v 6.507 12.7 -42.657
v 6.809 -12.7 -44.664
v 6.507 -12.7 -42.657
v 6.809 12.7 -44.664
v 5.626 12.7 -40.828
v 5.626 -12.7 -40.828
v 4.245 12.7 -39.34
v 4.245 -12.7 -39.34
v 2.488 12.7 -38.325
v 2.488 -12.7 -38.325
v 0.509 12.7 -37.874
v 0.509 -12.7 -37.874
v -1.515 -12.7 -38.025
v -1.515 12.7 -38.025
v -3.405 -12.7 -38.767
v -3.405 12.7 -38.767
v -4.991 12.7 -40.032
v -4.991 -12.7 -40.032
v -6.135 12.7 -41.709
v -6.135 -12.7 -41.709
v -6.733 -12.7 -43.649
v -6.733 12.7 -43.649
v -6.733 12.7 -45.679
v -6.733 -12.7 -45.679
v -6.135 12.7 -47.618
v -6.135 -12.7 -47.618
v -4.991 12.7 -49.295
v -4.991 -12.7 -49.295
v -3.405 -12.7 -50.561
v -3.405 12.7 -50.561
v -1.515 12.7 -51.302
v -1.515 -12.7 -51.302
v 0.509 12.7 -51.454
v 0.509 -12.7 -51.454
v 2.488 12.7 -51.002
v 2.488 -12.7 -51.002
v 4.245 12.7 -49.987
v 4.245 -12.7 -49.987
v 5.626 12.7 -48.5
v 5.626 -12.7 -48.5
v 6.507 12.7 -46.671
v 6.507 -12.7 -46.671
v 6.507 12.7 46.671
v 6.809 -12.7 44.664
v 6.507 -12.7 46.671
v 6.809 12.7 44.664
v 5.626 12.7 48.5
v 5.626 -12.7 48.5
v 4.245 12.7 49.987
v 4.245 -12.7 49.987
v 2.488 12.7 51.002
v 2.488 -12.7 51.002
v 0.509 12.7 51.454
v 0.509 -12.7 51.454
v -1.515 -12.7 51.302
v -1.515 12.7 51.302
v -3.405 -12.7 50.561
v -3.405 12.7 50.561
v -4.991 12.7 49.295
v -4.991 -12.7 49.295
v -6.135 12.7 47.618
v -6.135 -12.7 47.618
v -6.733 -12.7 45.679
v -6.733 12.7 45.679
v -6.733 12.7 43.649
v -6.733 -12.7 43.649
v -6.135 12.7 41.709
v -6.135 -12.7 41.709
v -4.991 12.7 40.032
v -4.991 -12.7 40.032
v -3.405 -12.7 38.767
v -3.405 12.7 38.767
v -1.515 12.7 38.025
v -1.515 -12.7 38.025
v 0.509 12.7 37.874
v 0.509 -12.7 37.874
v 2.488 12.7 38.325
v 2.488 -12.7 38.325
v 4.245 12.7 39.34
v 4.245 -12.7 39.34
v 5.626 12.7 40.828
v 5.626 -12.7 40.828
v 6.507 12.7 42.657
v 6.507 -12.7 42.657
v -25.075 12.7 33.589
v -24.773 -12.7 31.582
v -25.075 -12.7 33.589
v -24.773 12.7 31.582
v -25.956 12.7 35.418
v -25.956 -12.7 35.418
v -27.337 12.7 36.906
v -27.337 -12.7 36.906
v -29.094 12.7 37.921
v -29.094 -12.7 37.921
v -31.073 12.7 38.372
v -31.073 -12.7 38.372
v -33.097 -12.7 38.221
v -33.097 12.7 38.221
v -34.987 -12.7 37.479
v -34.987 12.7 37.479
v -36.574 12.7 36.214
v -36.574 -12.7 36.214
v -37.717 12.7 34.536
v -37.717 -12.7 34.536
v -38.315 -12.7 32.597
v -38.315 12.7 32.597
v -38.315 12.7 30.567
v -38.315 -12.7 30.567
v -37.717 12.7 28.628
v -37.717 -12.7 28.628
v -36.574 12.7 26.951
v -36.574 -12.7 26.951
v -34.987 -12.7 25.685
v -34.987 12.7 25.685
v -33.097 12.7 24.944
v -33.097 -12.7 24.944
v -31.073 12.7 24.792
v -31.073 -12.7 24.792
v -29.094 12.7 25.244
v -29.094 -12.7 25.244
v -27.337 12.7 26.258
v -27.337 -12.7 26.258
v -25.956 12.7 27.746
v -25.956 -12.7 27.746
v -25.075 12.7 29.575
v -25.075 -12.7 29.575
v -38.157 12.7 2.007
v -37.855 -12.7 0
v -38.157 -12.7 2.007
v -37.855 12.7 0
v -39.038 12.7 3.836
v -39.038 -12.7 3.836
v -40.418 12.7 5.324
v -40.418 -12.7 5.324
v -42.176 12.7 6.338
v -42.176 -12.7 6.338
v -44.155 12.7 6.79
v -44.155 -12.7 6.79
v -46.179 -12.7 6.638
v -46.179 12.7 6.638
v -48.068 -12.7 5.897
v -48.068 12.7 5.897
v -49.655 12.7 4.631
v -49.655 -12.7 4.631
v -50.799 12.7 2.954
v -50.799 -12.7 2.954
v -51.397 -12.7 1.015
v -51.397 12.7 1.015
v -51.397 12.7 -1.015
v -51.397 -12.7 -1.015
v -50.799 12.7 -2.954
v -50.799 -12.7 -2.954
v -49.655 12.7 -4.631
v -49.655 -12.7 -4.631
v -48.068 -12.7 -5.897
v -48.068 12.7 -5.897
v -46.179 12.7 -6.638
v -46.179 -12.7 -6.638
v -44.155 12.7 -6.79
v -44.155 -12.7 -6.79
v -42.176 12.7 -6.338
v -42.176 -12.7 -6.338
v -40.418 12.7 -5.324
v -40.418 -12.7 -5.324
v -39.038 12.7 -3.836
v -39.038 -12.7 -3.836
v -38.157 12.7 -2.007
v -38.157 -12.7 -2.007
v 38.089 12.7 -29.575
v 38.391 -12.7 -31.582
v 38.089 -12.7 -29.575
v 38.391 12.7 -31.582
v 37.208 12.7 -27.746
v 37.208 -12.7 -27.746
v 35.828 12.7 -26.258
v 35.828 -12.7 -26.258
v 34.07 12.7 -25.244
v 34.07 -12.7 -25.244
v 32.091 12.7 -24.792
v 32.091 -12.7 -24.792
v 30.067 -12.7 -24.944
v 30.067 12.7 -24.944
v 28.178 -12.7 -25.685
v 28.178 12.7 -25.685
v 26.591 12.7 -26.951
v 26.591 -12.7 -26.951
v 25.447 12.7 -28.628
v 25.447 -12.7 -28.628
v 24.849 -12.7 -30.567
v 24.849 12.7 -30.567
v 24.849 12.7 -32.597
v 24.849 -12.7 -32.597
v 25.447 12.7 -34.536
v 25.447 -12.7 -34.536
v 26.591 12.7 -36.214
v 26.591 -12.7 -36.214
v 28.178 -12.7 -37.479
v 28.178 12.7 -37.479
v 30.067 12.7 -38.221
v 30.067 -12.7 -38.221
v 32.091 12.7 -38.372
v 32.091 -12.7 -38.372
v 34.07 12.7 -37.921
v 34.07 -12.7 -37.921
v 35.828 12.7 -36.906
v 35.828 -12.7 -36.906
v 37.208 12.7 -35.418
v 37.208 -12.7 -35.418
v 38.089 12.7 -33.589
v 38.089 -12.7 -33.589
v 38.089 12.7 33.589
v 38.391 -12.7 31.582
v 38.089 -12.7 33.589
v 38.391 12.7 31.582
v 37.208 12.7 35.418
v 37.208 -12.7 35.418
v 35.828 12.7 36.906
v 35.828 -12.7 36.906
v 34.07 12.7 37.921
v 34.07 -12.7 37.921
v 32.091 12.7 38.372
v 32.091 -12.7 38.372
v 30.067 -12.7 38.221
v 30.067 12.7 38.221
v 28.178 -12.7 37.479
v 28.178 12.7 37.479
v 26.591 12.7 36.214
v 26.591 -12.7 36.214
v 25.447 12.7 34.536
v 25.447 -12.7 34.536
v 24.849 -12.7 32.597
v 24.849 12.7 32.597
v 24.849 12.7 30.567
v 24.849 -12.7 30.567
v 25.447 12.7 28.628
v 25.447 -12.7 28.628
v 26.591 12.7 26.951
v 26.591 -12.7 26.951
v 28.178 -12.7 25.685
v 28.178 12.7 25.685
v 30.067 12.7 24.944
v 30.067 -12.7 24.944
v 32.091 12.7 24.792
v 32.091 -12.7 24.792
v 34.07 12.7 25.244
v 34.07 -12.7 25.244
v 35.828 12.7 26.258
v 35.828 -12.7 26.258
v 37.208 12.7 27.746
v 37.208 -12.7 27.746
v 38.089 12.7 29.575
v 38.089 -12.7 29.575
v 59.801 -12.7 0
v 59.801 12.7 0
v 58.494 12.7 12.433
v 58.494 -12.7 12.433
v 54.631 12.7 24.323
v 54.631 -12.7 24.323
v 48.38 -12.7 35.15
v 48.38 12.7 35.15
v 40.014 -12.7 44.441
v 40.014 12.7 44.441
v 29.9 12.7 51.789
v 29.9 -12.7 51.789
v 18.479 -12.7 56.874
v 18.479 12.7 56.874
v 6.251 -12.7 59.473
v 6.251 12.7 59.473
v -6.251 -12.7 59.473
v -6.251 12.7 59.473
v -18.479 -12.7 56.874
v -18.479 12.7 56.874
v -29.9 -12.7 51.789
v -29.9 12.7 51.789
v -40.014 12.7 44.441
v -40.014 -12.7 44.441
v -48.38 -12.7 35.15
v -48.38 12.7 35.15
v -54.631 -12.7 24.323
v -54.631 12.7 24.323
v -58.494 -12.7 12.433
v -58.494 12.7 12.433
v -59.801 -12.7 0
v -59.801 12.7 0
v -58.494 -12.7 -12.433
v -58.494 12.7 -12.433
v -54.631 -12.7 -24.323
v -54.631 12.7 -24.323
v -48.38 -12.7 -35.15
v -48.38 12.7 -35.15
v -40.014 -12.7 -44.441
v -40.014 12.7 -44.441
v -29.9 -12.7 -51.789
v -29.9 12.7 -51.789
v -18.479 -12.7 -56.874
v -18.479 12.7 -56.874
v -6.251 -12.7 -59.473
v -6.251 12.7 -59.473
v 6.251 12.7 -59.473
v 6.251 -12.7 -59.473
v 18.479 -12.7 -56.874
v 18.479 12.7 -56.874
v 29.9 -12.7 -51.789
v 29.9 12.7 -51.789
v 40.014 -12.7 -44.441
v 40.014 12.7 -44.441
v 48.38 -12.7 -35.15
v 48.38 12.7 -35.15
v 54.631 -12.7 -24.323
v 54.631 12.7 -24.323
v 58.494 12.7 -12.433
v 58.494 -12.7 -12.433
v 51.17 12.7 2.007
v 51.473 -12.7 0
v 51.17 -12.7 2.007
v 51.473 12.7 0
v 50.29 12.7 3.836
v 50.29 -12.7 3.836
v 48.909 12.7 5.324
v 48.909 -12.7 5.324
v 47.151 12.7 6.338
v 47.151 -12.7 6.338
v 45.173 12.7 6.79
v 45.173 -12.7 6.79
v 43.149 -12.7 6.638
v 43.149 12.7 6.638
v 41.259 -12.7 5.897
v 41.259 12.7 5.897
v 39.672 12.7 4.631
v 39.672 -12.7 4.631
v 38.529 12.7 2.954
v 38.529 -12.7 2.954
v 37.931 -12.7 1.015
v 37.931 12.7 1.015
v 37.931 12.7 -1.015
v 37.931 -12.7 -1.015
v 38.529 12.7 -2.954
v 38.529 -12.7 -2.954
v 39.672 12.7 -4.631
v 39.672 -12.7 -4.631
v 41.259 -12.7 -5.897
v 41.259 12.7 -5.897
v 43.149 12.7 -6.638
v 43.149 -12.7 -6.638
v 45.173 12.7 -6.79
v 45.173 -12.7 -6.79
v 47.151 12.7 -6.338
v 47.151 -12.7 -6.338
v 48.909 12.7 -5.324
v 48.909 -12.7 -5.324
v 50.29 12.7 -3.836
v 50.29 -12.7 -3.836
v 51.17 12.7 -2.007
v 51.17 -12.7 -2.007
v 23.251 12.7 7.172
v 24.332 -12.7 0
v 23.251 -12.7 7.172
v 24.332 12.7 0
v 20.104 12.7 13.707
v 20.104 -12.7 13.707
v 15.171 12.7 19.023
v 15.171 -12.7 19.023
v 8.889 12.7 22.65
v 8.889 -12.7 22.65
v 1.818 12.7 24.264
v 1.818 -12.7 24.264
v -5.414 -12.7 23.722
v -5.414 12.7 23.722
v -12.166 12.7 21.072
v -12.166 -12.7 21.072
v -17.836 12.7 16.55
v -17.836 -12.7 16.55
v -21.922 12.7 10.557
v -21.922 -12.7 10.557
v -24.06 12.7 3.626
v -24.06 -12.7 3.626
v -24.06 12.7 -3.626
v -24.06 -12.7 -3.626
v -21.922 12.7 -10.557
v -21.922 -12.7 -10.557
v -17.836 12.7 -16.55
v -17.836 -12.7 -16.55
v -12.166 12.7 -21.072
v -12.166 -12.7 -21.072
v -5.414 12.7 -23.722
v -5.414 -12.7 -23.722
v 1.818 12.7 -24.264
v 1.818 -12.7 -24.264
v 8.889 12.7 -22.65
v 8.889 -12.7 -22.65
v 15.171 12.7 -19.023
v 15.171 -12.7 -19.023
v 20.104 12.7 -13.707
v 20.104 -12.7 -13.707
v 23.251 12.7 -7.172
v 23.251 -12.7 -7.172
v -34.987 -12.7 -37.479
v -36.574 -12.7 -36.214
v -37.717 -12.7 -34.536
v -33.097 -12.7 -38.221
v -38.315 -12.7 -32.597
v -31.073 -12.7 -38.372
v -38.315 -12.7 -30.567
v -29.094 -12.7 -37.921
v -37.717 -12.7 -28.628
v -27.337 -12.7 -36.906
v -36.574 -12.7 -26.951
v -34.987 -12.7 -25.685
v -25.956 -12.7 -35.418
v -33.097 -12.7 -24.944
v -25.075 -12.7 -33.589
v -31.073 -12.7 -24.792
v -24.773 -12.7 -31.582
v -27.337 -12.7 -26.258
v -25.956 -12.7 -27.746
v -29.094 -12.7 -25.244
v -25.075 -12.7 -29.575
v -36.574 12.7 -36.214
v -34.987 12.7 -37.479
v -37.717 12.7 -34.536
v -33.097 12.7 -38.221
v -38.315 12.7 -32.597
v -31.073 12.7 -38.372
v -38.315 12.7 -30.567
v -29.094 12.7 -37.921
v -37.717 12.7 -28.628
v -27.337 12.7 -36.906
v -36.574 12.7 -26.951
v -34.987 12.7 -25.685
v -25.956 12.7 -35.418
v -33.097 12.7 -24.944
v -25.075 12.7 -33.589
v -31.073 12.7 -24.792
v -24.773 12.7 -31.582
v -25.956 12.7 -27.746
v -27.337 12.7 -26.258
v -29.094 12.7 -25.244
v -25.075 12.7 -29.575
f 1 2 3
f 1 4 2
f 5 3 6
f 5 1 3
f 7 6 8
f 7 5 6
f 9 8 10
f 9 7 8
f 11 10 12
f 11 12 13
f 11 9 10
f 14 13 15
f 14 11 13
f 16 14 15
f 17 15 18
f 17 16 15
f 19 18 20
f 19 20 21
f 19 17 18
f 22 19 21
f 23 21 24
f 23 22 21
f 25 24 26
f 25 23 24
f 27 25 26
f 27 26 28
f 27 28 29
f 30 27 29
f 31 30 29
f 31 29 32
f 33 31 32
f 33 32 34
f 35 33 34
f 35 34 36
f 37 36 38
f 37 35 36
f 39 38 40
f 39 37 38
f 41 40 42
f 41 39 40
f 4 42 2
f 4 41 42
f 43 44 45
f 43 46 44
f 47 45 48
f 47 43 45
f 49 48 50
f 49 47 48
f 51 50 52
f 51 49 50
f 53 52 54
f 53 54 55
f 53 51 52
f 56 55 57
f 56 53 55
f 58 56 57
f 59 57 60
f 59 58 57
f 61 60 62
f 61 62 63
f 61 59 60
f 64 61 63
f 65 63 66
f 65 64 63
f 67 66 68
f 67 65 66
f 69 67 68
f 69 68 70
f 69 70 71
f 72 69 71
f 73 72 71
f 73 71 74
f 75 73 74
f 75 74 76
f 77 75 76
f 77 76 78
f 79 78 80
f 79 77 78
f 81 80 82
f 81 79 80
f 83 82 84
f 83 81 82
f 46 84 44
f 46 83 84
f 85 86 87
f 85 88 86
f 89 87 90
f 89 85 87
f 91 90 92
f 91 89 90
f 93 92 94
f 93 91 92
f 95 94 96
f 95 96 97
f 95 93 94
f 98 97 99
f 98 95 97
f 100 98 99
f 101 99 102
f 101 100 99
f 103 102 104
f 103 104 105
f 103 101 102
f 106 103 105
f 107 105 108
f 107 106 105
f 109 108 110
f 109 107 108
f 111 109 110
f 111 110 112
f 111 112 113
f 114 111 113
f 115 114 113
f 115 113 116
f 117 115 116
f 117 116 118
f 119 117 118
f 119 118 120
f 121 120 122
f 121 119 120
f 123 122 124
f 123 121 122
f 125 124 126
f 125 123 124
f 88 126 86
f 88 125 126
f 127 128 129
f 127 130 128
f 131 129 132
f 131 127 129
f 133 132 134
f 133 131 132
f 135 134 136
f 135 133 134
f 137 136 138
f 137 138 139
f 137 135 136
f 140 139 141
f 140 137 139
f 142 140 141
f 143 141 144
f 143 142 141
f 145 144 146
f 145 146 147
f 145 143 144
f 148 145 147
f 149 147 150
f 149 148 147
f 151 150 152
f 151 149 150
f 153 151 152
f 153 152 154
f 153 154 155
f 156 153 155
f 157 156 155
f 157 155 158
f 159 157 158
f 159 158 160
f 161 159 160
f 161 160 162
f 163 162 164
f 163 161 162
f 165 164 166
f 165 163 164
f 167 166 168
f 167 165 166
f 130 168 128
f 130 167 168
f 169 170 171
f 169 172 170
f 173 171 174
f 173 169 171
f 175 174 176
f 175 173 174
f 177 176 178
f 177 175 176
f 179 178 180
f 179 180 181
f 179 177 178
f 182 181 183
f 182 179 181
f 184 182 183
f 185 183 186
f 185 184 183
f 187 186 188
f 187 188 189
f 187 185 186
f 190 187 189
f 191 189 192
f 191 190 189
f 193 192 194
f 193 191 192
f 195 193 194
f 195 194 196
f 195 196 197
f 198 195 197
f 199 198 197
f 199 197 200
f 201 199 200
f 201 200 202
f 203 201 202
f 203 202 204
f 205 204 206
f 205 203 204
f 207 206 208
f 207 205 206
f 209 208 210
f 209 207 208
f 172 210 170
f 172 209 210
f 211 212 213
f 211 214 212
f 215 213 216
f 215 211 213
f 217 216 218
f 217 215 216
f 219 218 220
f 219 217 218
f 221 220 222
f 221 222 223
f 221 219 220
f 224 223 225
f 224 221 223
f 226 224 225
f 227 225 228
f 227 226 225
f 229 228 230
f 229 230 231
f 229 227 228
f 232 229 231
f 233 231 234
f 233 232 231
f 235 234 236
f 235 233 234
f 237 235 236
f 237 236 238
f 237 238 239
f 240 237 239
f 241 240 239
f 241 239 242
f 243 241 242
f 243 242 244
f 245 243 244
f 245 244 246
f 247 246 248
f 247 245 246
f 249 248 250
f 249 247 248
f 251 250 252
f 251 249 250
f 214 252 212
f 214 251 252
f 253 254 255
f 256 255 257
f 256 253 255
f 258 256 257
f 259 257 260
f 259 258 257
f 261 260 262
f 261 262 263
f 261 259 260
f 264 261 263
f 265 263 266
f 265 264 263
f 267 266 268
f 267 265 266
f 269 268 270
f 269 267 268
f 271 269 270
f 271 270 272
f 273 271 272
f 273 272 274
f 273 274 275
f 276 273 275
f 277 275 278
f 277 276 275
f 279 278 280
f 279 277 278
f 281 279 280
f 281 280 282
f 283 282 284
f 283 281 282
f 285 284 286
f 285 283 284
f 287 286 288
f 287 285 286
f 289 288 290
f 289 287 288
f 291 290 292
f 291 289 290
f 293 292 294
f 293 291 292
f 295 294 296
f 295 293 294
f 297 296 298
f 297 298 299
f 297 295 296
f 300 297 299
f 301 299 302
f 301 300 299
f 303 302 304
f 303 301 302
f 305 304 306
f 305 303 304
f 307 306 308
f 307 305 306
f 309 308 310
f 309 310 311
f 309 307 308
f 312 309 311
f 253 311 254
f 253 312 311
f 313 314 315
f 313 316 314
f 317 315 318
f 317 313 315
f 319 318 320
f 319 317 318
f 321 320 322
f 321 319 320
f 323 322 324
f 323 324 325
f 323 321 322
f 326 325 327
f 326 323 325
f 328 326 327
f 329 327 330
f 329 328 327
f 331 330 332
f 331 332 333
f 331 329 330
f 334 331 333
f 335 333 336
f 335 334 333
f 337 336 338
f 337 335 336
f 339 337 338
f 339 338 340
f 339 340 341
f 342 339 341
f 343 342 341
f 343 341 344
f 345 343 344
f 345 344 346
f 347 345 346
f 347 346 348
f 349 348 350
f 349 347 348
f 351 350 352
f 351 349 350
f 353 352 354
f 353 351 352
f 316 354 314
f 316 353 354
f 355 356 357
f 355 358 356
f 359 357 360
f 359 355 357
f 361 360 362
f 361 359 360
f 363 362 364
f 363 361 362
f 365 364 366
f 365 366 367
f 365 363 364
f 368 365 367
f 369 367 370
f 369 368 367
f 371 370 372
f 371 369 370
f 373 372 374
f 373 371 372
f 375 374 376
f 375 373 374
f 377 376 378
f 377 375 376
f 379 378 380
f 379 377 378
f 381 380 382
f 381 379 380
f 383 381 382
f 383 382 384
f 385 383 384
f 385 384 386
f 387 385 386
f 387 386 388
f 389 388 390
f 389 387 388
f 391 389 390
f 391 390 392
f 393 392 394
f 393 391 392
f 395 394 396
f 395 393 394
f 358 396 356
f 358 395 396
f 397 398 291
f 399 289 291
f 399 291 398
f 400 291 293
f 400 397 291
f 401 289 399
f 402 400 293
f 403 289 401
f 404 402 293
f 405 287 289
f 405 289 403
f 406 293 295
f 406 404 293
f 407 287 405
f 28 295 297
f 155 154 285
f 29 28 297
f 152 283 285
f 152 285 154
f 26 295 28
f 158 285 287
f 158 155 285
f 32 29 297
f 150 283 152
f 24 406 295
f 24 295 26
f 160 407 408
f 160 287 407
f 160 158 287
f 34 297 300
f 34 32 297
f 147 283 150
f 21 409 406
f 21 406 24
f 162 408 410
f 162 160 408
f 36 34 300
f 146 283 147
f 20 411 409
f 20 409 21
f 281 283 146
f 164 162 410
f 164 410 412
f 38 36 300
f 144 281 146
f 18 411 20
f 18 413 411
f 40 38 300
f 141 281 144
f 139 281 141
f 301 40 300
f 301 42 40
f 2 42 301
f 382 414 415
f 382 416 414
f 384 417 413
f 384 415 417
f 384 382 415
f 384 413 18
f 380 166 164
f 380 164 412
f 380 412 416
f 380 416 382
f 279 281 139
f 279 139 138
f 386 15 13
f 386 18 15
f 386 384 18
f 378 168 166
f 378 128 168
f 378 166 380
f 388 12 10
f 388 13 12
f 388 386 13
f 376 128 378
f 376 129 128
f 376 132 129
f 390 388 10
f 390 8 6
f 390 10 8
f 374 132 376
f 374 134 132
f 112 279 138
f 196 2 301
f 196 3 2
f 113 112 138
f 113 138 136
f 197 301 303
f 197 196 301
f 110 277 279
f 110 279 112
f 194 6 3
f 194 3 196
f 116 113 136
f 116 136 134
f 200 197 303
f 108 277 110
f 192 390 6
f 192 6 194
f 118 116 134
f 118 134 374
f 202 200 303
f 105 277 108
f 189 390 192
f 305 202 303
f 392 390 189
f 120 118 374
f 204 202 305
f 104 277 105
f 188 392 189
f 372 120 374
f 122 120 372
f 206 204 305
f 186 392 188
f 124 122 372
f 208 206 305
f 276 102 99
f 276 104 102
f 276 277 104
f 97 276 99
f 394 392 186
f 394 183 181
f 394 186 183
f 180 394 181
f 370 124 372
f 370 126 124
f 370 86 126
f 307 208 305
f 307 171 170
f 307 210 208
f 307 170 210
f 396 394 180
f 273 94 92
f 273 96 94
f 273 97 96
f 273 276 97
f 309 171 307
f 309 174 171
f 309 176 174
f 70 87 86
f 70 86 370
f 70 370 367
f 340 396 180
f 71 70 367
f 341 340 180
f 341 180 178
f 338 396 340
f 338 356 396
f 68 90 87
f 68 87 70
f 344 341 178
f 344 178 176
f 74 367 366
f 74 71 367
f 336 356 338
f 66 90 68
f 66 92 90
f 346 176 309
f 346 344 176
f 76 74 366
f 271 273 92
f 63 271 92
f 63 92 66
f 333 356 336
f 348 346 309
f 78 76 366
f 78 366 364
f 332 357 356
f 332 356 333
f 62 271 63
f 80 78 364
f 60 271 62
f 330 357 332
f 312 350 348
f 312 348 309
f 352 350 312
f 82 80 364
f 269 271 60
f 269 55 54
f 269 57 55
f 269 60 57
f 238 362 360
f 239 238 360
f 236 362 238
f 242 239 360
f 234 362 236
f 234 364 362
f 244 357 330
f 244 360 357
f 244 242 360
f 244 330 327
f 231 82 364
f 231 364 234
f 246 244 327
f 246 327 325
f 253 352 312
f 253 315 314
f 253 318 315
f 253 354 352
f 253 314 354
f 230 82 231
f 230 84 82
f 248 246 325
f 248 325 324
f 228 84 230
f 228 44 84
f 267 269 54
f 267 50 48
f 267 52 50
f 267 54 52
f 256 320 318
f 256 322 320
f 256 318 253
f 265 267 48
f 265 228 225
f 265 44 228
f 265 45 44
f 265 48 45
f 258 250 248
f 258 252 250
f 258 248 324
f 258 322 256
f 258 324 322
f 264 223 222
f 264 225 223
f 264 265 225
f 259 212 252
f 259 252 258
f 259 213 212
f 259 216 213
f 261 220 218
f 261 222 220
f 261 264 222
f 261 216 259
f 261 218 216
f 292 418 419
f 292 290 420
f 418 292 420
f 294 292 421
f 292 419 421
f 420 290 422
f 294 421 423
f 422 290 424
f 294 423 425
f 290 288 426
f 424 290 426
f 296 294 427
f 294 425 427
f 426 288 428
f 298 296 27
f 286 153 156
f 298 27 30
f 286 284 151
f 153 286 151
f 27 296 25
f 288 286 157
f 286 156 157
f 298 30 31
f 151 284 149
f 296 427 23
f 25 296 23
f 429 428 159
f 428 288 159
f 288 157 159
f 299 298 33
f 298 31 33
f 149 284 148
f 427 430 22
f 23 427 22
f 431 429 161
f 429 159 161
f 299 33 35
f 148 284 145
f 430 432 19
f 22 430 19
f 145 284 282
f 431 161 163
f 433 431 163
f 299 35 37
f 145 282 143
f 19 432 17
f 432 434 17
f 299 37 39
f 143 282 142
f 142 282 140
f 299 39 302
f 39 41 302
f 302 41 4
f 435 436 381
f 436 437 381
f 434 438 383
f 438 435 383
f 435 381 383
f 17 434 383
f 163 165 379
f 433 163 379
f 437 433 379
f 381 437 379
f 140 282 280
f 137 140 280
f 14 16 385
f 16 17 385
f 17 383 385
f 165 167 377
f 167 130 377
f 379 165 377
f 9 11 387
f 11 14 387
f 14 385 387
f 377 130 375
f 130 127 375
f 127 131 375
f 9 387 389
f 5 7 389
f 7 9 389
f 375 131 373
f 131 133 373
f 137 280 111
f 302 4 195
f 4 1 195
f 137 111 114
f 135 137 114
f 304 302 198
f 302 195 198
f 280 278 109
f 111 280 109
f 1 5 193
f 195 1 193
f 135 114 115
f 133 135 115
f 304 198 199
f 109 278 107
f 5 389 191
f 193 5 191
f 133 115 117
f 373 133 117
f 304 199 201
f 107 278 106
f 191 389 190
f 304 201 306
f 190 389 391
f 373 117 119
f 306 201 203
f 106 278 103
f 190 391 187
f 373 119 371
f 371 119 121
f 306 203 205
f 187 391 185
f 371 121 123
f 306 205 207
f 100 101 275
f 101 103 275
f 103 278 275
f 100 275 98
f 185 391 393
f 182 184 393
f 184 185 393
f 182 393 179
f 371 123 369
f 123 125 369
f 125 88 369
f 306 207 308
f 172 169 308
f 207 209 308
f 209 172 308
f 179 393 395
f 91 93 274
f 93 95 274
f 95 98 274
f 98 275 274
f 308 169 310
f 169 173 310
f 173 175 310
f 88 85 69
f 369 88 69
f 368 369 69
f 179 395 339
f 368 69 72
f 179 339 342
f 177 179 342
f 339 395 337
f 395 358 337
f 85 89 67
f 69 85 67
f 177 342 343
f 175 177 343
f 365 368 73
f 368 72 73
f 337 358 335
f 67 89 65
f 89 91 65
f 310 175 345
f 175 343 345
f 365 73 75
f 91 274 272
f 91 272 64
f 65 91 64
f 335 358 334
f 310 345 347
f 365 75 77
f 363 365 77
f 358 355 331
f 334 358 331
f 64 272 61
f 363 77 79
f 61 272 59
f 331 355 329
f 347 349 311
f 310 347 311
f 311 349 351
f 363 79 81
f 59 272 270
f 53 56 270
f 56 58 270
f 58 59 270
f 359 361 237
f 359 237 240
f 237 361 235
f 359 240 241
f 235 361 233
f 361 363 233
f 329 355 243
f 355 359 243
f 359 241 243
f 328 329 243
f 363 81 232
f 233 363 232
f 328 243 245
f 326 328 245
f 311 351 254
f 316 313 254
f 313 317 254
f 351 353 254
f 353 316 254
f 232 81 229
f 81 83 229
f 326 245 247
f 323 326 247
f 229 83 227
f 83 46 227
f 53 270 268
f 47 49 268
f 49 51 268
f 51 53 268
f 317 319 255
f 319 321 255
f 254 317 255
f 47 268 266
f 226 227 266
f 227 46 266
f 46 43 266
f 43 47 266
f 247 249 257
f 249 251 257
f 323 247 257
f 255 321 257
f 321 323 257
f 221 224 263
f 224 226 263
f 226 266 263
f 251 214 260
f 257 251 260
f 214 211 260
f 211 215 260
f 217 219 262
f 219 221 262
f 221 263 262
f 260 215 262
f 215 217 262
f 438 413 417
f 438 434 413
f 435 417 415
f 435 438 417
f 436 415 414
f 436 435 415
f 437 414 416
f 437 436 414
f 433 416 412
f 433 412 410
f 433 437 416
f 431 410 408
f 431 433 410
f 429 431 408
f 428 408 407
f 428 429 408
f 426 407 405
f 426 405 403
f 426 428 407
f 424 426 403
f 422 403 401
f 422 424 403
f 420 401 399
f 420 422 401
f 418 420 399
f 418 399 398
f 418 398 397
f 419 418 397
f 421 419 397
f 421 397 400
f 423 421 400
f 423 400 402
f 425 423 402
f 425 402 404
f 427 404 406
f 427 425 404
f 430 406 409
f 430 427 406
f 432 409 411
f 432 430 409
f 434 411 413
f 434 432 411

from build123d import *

# Parameters (mm, degrees)
F0_R     = 59.80071
F0_R_2   = 6.809169
F0_R_3   = 24.331807
F1_DEPTH = 12.7


with BuildPart() as f1:
    # F0 (on Front) → F1 (new body, symmetric)
    with BuildSketch(Plane.XZ):
        Circle(F0_R)
        with Locations((-31.582093, -31.582093)):
            Circle(F0_R_2, mode=Mode.SUBTRACT)
        with Locations((0, -44.663824)):
            Circle(F0_R_2, mode=Mode.SUBTRACT)
        with Locations((31.582093, -31.582093)):
            Circle(F0_R_2, mode=Mode.SUBTRACT)
        with Locations((-44.663824, 0)):
            Circle(F0_R_2, mode=Mode.SUBTRACT)
        with Locations((-31.582093, 31.582093)):
            Circle(F0_R_2, mode=Mode.SUBTRACT)
        Circle(F0_R_3, mode=Mode.SUBTRACT)
        with Locations((44.663824, 0)):
            Circle(F0_R_2, mode=Mode.SUBTRACT)
        with Locations((0, 44.663824)):
            Circle(F0_R_2, mode=Mode.SUBTRACT)
        with Locations((31.582093, 31.582093)):
            Circle(F0_R_2, mode=Mode.SUBTRACT)
    extrude(amount=F1_DEPTH, both=True)


solid = f1.part
